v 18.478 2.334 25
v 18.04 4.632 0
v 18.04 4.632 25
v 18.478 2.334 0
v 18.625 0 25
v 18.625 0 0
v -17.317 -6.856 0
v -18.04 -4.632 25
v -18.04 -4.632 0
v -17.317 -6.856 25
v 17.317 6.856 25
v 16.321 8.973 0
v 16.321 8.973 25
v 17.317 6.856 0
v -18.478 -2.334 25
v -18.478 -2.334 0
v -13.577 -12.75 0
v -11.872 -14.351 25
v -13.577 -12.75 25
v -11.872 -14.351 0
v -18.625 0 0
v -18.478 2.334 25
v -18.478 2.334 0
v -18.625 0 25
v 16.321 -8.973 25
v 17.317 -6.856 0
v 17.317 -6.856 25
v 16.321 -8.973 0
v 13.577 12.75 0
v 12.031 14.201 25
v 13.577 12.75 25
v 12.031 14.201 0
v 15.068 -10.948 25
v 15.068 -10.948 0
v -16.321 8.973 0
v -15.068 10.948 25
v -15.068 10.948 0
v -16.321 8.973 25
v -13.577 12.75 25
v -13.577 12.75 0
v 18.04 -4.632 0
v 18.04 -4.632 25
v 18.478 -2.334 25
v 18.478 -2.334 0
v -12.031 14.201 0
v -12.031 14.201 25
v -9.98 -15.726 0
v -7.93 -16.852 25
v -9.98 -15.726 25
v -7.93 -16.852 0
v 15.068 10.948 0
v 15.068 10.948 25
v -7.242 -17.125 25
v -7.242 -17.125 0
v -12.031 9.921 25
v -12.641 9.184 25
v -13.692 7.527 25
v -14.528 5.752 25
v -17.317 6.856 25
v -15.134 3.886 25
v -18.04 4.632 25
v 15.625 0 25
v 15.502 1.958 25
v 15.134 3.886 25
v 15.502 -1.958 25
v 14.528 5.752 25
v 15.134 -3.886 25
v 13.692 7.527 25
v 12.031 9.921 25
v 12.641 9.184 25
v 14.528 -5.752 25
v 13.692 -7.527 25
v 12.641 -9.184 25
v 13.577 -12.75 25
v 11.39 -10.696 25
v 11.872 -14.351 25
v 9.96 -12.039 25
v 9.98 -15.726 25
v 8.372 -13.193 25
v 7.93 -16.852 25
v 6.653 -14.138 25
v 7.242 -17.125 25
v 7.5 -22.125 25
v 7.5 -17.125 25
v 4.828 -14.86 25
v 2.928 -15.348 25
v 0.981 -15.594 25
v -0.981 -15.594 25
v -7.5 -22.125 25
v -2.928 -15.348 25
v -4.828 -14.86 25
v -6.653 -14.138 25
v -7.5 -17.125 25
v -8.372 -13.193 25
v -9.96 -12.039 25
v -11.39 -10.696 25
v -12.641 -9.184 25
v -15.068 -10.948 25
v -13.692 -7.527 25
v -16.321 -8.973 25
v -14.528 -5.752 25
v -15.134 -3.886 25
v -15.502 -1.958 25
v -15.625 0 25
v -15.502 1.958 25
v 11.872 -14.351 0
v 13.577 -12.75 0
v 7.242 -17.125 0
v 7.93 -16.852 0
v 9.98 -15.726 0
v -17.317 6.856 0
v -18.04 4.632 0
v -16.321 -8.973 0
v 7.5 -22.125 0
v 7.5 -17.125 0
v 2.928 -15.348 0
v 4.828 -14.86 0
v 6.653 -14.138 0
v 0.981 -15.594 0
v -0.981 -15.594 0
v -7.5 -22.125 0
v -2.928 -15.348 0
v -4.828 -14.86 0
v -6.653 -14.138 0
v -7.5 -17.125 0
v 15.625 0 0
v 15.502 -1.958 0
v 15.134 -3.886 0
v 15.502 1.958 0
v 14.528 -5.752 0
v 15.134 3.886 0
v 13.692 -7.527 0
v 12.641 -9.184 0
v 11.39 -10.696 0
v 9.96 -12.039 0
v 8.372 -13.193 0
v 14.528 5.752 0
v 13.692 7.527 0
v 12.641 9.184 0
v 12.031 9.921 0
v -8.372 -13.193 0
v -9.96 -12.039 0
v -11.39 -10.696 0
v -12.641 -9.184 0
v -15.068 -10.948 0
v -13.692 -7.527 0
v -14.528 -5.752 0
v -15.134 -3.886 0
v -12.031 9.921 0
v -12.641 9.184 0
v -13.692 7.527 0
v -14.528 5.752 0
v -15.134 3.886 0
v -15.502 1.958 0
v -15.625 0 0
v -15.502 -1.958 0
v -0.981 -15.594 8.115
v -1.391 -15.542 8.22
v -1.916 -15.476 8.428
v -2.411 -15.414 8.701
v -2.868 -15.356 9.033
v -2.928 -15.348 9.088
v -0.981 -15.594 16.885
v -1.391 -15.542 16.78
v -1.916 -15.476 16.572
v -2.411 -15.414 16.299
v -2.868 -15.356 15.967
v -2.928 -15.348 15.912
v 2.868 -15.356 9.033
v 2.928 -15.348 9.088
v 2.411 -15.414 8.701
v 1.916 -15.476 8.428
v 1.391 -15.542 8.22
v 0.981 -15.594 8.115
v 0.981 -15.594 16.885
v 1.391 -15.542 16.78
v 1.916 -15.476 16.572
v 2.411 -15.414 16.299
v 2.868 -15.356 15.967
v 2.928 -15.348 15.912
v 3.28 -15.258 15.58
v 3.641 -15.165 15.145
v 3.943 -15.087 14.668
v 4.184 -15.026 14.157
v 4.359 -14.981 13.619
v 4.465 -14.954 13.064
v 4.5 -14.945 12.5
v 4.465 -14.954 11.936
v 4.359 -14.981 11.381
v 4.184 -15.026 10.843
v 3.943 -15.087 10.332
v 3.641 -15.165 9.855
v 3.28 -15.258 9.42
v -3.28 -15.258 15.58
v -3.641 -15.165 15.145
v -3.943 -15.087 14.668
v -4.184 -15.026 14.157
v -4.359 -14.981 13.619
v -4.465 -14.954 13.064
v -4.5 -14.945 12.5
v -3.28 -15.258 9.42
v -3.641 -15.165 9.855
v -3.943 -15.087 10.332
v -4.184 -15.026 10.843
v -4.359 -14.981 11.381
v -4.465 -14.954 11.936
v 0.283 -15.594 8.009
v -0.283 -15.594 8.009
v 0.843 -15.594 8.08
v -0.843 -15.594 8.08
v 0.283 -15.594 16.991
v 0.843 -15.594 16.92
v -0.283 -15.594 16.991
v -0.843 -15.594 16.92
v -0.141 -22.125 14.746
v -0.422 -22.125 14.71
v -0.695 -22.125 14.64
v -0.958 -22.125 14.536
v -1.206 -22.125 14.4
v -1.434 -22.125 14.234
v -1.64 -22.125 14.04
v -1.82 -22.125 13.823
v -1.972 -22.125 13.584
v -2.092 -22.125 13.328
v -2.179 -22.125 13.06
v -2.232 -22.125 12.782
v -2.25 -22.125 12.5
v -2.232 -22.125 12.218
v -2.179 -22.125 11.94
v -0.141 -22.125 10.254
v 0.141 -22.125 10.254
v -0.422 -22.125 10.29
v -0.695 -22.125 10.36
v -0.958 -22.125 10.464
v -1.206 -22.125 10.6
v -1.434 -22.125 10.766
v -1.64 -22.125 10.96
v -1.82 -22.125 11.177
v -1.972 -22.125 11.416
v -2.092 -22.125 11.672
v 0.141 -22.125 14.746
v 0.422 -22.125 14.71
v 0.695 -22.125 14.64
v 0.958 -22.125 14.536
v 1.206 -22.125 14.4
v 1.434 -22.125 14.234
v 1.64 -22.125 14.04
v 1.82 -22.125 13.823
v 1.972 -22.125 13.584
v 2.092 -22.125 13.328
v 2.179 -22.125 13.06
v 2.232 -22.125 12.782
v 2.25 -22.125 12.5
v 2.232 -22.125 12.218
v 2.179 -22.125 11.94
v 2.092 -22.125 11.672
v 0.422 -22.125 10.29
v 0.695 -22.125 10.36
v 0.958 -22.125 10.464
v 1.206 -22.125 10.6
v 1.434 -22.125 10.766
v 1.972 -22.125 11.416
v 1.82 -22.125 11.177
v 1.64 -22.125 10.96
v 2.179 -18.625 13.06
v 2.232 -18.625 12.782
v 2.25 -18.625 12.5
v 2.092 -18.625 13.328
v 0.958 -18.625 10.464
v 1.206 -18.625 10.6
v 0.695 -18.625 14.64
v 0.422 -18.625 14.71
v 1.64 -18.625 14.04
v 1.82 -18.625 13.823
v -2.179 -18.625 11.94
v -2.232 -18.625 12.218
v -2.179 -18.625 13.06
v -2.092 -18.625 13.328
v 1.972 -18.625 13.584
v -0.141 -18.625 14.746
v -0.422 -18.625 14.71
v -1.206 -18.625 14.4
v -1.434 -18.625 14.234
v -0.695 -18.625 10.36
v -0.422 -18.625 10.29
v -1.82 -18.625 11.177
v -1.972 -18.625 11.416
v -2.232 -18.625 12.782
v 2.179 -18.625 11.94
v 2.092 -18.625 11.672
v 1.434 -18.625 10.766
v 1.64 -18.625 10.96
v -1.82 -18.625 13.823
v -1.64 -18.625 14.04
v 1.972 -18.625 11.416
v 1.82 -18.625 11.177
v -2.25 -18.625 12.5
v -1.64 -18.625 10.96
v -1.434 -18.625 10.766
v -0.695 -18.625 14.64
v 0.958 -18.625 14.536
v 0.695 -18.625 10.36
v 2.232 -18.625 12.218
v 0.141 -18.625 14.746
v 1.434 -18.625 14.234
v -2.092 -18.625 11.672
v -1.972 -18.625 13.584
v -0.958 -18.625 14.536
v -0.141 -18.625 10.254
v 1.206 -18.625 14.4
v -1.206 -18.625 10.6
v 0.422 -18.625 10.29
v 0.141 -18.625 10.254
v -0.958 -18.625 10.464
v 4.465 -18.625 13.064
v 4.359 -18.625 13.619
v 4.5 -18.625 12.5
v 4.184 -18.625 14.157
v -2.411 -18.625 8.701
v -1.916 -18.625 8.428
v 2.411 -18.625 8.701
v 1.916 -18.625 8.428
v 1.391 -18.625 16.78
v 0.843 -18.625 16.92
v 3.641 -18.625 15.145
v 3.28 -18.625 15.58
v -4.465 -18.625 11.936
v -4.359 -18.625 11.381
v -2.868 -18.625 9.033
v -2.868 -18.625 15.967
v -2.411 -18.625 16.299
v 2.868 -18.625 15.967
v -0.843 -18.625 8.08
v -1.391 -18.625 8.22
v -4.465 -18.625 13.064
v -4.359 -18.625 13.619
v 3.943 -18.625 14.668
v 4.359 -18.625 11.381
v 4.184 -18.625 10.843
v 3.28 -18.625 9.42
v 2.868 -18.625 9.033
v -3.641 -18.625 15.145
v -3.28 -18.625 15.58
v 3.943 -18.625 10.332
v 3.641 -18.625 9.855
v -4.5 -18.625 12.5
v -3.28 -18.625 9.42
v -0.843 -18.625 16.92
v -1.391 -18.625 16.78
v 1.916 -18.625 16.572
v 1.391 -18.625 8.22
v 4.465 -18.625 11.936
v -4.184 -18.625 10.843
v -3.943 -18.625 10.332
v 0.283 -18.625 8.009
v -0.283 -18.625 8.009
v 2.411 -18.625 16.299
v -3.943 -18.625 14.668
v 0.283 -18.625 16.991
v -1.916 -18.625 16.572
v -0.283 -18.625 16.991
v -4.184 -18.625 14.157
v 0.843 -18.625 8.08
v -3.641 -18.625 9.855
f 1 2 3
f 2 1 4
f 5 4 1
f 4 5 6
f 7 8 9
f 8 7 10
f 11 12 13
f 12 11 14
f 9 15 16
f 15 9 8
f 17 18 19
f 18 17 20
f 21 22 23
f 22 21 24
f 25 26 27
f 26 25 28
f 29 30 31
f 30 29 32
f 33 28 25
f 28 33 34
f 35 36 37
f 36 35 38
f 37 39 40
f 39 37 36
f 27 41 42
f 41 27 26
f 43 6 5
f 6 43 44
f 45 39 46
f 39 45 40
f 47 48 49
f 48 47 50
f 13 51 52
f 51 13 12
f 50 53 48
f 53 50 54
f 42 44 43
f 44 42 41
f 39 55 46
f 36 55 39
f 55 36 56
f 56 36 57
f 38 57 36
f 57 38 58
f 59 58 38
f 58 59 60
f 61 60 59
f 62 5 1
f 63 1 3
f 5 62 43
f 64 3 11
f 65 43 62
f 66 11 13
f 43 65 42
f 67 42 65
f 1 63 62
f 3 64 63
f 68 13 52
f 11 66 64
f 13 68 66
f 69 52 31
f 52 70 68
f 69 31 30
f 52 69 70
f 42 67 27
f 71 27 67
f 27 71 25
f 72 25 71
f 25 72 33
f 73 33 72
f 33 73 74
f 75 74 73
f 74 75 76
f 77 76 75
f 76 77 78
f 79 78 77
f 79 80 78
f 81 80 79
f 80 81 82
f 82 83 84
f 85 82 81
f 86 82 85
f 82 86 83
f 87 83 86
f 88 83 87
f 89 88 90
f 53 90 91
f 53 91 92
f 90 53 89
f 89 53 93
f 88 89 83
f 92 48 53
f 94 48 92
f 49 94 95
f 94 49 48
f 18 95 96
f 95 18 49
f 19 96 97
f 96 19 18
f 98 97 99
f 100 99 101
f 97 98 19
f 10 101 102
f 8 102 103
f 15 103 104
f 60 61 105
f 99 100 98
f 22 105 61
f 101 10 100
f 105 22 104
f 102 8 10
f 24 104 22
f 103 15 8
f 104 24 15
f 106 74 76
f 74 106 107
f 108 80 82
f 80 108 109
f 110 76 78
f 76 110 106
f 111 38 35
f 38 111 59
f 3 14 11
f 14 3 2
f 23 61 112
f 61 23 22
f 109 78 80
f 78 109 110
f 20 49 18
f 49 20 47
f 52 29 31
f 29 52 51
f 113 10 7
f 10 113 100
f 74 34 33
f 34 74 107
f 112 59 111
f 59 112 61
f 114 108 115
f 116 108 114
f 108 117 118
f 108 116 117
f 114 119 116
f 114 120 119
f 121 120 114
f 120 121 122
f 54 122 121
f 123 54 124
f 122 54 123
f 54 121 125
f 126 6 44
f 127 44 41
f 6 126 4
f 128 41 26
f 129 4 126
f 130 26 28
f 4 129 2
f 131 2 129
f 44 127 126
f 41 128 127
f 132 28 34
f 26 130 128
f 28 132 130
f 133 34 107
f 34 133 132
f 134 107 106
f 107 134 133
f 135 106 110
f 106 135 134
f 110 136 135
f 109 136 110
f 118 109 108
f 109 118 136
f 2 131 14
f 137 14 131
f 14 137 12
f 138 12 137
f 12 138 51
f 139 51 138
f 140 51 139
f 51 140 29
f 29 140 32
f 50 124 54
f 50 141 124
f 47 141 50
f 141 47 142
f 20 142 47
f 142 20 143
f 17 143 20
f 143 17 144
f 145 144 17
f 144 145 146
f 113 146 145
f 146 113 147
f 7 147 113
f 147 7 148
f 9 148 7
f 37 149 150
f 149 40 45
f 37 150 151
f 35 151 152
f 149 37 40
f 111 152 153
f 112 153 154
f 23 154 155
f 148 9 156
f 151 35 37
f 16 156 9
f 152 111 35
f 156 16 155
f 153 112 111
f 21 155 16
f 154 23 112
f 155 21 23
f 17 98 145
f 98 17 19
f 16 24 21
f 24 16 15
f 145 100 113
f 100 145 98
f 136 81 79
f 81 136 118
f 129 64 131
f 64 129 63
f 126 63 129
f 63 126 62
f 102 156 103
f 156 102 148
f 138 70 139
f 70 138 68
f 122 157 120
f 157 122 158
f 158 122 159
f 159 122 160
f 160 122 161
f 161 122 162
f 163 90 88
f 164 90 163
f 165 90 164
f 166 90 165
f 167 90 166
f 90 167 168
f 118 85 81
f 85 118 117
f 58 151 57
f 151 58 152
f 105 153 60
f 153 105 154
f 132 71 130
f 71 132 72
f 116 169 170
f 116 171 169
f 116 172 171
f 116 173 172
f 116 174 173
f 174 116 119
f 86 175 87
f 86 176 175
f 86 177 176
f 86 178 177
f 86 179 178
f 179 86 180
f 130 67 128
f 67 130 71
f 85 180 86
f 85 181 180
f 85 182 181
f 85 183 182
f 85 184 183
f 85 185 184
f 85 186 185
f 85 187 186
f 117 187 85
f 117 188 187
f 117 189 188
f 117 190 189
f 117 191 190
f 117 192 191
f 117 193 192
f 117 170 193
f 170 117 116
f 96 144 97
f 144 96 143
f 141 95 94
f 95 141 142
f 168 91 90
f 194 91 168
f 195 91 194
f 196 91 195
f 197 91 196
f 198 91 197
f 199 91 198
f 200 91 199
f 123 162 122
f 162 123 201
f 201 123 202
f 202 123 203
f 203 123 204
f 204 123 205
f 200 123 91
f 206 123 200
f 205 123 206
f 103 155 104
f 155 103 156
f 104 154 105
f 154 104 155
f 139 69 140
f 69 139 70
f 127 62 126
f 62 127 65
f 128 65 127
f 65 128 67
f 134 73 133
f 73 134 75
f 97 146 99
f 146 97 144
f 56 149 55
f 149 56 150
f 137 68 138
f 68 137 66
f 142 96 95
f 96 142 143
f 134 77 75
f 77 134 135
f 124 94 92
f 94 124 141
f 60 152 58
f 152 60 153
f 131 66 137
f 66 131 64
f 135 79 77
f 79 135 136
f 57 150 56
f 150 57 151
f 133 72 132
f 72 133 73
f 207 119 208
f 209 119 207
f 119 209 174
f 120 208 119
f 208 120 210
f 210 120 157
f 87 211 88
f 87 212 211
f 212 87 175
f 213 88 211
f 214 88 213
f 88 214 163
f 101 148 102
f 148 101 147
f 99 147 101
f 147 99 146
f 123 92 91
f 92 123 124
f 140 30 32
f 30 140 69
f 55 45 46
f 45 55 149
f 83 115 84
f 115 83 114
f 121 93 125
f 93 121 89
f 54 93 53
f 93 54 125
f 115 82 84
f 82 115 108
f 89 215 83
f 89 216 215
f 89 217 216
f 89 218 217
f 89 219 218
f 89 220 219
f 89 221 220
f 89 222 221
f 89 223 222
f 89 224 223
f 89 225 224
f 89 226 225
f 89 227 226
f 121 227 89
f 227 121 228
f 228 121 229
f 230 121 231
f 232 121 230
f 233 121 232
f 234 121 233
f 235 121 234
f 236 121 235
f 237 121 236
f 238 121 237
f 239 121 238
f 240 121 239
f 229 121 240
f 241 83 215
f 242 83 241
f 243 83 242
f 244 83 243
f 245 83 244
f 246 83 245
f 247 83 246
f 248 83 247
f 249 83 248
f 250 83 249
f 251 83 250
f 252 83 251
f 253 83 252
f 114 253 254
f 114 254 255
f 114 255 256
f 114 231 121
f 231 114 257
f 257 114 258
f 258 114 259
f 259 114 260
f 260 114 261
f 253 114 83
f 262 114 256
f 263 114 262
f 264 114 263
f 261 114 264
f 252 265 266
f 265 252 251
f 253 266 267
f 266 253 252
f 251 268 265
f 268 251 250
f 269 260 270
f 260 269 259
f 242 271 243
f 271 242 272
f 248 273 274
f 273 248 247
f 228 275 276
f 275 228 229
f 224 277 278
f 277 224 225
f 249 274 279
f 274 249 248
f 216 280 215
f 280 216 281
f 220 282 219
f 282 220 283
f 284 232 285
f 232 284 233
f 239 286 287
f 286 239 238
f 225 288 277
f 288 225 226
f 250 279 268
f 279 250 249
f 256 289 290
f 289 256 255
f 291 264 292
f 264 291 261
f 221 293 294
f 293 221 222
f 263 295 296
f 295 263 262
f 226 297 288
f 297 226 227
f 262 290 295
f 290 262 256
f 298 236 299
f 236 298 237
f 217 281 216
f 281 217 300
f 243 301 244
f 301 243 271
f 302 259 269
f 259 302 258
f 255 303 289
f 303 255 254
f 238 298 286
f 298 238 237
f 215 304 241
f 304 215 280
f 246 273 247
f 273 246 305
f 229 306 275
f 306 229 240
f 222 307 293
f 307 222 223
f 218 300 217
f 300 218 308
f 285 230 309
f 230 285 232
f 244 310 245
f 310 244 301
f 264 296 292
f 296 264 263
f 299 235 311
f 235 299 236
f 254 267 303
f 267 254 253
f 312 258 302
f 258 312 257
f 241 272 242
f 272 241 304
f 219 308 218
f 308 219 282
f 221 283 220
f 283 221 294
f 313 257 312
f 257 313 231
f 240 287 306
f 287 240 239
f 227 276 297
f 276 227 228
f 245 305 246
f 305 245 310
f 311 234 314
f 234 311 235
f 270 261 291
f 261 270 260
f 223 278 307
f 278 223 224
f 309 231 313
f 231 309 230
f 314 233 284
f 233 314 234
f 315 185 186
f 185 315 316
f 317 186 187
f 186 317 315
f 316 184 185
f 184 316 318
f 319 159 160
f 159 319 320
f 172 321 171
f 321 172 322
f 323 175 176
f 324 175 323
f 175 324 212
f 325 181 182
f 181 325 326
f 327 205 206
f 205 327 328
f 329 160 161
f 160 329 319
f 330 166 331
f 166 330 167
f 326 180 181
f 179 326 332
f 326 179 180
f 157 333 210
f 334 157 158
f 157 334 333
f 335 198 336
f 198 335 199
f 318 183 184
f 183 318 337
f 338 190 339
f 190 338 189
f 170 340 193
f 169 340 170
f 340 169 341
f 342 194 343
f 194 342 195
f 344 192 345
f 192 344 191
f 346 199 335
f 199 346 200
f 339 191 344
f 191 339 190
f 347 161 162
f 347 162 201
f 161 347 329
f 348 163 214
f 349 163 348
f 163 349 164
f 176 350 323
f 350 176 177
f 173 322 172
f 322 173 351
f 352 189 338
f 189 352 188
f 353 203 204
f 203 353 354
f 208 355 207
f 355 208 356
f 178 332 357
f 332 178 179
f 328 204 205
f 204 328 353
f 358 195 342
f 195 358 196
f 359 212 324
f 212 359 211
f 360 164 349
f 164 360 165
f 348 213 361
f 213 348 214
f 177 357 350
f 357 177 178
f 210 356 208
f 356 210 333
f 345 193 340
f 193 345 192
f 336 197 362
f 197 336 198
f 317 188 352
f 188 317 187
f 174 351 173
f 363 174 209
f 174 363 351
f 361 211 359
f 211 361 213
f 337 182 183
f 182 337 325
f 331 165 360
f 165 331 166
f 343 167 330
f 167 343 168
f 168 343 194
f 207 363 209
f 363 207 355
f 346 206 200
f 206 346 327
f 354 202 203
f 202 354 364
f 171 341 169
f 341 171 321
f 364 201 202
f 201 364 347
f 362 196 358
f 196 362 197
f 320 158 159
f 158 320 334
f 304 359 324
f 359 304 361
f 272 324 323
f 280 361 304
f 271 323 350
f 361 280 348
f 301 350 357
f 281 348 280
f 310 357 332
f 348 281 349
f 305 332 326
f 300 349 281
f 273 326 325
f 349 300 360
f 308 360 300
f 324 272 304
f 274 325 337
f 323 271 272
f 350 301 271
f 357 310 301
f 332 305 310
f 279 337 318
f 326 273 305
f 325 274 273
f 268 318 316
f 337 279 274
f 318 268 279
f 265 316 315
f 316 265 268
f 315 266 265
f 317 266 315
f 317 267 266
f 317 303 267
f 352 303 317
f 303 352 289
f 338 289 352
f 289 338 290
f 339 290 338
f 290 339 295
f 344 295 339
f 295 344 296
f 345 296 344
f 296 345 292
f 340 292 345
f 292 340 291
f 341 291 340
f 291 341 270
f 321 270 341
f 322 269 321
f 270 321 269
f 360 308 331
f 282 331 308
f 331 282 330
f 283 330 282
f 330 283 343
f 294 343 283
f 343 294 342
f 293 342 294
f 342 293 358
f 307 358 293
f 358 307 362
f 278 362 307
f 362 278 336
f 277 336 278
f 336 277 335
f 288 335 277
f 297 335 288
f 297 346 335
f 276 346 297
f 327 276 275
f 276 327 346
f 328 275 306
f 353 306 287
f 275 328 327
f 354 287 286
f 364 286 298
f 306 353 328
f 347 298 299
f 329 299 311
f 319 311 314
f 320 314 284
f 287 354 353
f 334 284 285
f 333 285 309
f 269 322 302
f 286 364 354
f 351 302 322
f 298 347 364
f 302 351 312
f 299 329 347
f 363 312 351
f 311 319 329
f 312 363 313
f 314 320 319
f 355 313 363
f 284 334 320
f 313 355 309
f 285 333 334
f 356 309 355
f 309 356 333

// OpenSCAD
//Clamp for the mount for WLANThermo Nano, Mini, MiniV2
//Fully configurable
//(c)Armin Thinnes, Juni 2018
//Find more about the fine BBQ-thermometre at https://www.wlanthermo/de and visit the forum: https://forum.wlanthermo.de




innendurchmesser=31.25; //inner diametre, 31.25 for Napoleon handle, 25 for Weber kettle-leg
wandstaerke=3; //wallthickness
breite=25; //clamp-width
oeffnung=0.77; // percentage of diameter for the opening
flanschbreite=15; //width of flansch
flanschhoehe=5; //thickness of flansch, make sure it is > wandstaerke/2

aussendurchmesser=2*wandstaerke+innendurchmesser;
$fn=50;

module ring() {
difference(){
    cylinder (d=aussendurchmesser,h=breite);
    cylinder (d=innendurchmesser,h=breite);
    translate ([-oeffnung*innendurchmesser/2,0,0]) cube([oeffnung*innendurchmesser,aussendurchmesser,breite]);
}
}
module ring_plus(){
    ring();
    translate([-flanschbreite/2,-(innendurchmesser/2+flanschhoehe+wandstaerke/2),0]) cube([flanschbreite,flanschhoehe,breite]);
};
difference(){
    ring_plus();
    translate ([0,0,breite/2]) rotate([90,0,0]) cylinder(d=4.5, h=innendurchmesser/2+wandstaerke+flanschhoehe);
    translate ([0,0,breite/2]) rotate([90,0,0]) cylinder(d=9, h=innendurchmesser/2 + wandstaerke);
};
